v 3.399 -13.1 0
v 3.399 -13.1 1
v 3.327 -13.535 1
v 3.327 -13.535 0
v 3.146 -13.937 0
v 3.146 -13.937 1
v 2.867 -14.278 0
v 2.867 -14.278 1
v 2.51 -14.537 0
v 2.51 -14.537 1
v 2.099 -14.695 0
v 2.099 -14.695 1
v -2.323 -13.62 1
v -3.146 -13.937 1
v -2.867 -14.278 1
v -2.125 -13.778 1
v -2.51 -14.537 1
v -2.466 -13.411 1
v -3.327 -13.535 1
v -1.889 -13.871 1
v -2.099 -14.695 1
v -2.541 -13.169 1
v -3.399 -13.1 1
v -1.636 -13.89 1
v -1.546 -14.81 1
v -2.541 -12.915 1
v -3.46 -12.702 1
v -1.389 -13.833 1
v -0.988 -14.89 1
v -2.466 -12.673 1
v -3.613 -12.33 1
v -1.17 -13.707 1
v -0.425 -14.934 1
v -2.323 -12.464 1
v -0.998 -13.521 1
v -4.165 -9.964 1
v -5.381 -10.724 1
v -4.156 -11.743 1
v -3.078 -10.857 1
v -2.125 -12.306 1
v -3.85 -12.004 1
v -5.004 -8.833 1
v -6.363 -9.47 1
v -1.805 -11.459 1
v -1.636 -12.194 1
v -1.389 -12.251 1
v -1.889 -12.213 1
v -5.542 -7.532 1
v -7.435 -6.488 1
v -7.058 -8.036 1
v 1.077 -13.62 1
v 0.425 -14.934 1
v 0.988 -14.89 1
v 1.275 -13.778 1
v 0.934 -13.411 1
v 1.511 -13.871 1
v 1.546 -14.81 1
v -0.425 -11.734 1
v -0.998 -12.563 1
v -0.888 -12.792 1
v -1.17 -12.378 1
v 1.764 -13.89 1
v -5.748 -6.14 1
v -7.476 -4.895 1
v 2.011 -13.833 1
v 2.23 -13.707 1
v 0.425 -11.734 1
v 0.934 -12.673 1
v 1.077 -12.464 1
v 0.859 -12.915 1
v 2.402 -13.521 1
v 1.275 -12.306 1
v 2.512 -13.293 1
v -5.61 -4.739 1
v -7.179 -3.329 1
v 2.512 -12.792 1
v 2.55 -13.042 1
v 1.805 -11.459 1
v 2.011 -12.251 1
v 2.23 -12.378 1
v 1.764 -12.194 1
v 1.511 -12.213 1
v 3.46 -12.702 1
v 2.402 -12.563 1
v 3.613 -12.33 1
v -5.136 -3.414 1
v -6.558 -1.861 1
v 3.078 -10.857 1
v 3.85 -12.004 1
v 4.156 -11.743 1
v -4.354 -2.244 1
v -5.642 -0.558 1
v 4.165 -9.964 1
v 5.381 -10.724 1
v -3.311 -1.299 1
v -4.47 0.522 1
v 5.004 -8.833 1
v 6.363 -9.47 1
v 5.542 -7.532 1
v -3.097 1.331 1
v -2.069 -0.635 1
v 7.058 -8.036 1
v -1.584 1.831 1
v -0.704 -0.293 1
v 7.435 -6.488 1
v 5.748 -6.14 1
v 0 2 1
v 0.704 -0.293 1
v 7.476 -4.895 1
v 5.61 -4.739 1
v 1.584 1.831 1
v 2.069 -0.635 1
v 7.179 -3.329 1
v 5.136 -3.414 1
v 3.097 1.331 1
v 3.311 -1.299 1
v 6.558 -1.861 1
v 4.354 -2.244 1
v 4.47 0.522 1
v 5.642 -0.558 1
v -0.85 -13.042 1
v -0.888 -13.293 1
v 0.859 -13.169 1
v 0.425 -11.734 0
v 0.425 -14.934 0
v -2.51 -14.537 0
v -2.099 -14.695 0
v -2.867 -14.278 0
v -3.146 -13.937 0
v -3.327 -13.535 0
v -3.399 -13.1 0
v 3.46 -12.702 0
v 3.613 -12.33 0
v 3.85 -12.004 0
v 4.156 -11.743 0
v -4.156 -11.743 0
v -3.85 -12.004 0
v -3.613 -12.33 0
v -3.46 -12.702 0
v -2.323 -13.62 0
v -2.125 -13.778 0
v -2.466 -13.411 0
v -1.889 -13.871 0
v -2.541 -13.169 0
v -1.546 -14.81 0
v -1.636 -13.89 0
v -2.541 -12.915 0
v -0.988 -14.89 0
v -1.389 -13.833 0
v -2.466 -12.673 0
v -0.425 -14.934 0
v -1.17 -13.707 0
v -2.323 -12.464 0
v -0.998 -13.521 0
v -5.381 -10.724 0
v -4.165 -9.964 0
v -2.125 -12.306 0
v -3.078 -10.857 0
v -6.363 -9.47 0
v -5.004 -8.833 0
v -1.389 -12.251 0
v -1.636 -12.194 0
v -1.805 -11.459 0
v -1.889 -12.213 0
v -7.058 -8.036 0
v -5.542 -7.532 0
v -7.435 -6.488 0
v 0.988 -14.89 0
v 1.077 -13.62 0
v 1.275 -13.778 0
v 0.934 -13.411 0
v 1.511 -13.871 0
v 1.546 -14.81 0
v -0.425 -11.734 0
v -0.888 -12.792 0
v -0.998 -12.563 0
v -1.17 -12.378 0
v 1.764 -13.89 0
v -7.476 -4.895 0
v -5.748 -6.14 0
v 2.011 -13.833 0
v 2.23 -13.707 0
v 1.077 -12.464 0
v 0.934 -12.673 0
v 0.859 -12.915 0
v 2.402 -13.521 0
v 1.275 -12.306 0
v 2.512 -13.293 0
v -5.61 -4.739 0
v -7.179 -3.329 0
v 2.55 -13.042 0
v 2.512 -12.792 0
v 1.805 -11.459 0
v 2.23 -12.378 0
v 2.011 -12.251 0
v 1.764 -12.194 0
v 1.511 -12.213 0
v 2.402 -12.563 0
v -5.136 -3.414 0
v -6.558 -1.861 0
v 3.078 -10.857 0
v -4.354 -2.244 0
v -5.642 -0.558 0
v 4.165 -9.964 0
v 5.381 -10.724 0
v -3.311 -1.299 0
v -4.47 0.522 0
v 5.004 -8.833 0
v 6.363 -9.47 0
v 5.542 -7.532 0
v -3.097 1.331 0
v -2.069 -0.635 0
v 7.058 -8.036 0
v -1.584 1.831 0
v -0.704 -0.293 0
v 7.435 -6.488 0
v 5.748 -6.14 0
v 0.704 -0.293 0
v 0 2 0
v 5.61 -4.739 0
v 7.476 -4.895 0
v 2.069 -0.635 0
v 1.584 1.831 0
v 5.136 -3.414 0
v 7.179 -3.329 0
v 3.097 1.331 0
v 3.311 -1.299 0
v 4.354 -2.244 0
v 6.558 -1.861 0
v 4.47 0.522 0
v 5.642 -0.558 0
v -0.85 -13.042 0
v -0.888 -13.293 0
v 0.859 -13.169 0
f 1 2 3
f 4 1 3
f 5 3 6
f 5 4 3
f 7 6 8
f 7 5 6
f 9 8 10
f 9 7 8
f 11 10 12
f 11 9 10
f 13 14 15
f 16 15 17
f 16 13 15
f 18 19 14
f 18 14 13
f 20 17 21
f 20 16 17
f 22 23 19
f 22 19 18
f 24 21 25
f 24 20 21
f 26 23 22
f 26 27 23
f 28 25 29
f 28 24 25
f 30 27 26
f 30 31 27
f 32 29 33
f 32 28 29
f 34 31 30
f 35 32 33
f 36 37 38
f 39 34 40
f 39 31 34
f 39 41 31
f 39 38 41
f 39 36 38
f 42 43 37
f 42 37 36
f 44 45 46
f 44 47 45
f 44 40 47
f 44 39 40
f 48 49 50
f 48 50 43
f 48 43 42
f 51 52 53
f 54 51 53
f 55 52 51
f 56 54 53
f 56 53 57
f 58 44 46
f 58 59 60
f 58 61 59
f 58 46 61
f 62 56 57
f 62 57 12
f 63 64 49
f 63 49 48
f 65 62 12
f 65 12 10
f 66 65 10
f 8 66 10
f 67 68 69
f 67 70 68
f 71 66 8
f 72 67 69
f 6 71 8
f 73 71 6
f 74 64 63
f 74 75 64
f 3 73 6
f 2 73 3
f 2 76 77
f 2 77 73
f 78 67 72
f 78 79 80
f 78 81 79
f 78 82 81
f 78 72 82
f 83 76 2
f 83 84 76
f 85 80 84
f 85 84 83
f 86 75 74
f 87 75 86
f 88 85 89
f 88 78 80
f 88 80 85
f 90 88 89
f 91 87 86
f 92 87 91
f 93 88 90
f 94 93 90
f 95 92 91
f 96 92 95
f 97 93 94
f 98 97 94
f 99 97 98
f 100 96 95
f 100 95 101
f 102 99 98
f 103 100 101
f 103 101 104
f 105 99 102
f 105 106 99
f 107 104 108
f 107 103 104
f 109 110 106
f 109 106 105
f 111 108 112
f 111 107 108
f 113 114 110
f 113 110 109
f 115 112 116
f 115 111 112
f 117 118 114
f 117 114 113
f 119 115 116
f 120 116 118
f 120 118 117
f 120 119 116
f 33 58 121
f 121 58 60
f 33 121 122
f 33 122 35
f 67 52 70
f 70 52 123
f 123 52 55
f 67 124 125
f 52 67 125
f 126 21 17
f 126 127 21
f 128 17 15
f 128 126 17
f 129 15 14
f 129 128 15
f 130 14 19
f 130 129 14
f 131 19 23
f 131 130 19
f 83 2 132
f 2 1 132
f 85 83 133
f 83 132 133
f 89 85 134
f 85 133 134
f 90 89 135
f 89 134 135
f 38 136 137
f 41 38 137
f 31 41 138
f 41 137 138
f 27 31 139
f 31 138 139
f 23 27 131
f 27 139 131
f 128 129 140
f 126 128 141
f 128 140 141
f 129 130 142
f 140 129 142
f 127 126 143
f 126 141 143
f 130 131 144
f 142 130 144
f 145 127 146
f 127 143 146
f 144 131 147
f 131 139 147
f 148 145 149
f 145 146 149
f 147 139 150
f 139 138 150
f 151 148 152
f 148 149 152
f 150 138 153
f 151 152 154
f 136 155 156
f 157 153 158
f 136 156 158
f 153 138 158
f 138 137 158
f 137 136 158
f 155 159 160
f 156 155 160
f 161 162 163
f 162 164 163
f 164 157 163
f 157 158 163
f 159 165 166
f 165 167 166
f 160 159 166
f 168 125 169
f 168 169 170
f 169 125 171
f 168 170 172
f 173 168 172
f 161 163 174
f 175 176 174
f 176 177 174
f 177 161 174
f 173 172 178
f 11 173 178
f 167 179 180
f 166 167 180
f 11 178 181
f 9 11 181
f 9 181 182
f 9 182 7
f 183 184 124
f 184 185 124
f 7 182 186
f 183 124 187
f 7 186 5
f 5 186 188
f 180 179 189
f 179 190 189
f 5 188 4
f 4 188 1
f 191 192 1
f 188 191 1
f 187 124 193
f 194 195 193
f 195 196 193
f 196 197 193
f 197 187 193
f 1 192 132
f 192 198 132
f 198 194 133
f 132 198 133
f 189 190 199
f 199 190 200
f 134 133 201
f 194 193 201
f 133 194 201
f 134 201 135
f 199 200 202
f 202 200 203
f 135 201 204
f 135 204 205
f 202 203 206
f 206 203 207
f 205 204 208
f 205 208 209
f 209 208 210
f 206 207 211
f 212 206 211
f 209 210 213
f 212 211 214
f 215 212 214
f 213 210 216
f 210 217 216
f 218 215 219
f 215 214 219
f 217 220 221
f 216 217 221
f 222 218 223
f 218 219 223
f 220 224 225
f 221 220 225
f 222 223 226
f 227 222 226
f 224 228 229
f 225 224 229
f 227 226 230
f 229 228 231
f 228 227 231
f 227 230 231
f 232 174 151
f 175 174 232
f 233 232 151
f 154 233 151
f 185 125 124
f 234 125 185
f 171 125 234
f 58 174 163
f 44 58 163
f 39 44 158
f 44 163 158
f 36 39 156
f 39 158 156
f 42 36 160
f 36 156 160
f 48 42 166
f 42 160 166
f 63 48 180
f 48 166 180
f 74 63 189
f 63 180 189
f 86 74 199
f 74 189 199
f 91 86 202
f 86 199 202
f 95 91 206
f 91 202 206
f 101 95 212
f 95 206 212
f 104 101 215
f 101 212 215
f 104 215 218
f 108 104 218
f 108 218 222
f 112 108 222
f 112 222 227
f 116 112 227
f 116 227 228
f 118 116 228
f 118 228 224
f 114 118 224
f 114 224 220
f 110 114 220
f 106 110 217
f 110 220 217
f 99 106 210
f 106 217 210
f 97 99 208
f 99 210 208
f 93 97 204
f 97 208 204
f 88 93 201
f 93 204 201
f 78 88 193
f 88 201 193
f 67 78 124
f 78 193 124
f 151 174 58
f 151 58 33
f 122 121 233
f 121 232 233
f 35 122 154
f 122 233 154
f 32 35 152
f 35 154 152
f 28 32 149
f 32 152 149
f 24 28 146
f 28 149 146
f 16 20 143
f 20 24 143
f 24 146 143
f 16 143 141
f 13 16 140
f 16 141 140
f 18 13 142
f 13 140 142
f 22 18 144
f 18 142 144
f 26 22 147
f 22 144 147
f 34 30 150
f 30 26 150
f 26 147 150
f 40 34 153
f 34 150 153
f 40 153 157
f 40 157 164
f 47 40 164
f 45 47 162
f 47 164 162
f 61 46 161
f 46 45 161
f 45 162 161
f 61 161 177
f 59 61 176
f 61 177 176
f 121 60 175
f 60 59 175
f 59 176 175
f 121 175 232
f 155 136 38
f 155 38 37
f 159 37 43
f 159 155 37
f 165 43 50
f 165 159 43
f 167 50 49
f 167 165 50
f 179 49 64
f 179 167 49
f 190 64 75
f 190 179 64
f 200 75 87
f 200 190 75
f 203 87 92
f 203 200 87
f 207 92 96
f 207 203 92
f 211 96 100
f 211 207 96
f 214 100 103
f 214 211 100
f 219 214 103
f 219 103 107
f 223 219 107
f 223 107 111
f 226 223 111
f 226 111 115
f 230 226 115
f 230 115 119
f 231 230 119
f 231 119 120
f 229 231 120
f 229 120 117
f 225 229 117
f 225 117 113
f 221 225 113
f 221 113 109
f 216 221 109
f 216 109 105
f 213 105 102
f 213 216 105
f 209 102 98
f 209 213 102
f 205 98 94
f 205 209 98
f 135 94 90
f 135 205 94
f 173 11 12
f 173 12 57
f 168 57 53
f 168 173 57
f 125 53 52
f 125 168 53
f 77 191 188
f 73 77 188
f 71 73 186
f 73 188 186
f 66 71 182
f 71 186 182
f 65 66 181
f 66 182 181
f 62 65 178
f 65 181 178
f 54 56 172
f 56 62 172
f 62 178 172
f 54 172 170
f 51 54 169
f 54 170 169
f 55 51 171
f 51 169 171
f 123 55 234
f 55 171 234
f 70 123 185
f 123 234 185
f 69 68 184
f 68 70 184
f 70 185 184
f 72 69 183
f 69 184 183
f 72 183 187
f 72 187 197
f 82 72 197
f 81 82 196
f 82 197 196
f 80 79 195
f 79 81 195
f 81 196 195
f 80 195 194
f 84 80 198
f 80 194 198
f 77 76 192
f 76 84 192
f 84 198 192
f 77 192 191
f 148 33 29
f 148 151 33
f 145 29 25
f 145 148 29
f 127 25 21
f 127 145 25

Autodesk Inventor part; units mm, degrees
ref_plane "YZ Plane" through (0, 0, 0) normal (1, 0, 0) x (0, 1, 0)
ref_plane "XZ Plane" through (0, 0, 0) normal (0, 1, 0) x (-1, 0, 0)
sketch "Náčrt1" plane through (0, 0, 0) normal (0, 0, 1) x (1, 0, 0)
  line L0 (-6, 0) -> (6, 0) construction
  arc A0 (0.425, -11.7343) -> (-0.425, -11.7343) centre (0, -6) ccw
  line L1 (0, 20.1894) -> (0, -80.5364) projected
  line L2 (-48.09, 0) -> (48.09, 0) projected
  line L3 (-0.425, -11.7343) -> (-0.425, -14.9343)
  line L4 (-0.425, -6.5402) -> (-0.425, -13.29) construction
  line L5 (-2.7947, 2) -> (3.6722, 2) construction
  arc A1 (4.156, -11.7432) -> (-4.156, -11.7432) centre (0, -5.5) ccw
  arc A2 (-2.0989, -14.6946) -> (-0.425, -14.9343) centre (0, -6) ccw
  arc A3 (-3.399, -13.1002) -> (-2.0989, -14.6946) centre (-1.7, -13.0421) ccw
  arc A4 (-3.399, -13.1002) -> (-4.156, -11.7432) centre (-5.098, -13.1583) ccw
  line L6 (0.425, -11.7343) -> (0.425, -14.9343)
  line L7 (0.425, -6.5402) -> (0.425, -13.29) construction
  arc A5 (0.425, -14.9343) -> (2.0989, -14.6946) centre (0, -6) ccw
  arc A6 (2.0989, -14.6946) -> (3.399, -13.1002) centre (1.7, -13.0421) ccw
  arc A7 (4.156, -11.7432) -> (3.399, -13.1002) centre (5.098, -13.1583) ccw
  circle A8 centre (-1.7, -13.0421) radius 0.85
  circle A9 centre (1.7, -13.0421) radius 0.85
  dimension "d0" = 11.5
  dimension "d1" = 3.2
  dimension "d6" = 0.425
  dimension "d7" = 2
  dimension "d8" = 0.5
  dimension "d9" = 1.7
  dimension "d10" = 1.7
  dimension "d11" = 1.275
  dimension "d12" = 1.7
  dimension "d13" = 1.7
  dimension "d14" = 6
extrude "Těleso" add sketch "Náčrt1" along normal blind 1
ref_plane "Work Plane1" through (0, -6, 0) normal (1, 0, 0) x (0, 0, 1)
equation "\"d0\" = ND"
equation "\"d1\" = SRB2"
equation "\"d6\" = 0.25 * SD5"
equation "\"d7\" = SRB1"
equation "\"d8\" = 0.25 * SRB1"
equation "\"d9\" = SD5"
equation "\"d10\" = SD5"
equation "\"d11\" = 0.75 * SD5"
equation "\"d12\" = SD5"
equation "\"d13\" = SD5"
equation "\"d14\" = 0.5 * WD"
equation "\"d2\" = SD"
equation "\"WD\" = WDMIN"
equation "\"SD\" = 1"
equation "\"SRB1\" = 2"
equation "\"ND\" = 11.5"
equation "\"SRB2\" = 3.2"
equation "\"SD5\" = 1.7"
equation "\"WDMIN\" = 12"
equation "\"SD3\" = 11"
equation "\"WDMAX\" = 13"
properties part number "CSN 02 2930 - 12" material "Nerezová ocel"
